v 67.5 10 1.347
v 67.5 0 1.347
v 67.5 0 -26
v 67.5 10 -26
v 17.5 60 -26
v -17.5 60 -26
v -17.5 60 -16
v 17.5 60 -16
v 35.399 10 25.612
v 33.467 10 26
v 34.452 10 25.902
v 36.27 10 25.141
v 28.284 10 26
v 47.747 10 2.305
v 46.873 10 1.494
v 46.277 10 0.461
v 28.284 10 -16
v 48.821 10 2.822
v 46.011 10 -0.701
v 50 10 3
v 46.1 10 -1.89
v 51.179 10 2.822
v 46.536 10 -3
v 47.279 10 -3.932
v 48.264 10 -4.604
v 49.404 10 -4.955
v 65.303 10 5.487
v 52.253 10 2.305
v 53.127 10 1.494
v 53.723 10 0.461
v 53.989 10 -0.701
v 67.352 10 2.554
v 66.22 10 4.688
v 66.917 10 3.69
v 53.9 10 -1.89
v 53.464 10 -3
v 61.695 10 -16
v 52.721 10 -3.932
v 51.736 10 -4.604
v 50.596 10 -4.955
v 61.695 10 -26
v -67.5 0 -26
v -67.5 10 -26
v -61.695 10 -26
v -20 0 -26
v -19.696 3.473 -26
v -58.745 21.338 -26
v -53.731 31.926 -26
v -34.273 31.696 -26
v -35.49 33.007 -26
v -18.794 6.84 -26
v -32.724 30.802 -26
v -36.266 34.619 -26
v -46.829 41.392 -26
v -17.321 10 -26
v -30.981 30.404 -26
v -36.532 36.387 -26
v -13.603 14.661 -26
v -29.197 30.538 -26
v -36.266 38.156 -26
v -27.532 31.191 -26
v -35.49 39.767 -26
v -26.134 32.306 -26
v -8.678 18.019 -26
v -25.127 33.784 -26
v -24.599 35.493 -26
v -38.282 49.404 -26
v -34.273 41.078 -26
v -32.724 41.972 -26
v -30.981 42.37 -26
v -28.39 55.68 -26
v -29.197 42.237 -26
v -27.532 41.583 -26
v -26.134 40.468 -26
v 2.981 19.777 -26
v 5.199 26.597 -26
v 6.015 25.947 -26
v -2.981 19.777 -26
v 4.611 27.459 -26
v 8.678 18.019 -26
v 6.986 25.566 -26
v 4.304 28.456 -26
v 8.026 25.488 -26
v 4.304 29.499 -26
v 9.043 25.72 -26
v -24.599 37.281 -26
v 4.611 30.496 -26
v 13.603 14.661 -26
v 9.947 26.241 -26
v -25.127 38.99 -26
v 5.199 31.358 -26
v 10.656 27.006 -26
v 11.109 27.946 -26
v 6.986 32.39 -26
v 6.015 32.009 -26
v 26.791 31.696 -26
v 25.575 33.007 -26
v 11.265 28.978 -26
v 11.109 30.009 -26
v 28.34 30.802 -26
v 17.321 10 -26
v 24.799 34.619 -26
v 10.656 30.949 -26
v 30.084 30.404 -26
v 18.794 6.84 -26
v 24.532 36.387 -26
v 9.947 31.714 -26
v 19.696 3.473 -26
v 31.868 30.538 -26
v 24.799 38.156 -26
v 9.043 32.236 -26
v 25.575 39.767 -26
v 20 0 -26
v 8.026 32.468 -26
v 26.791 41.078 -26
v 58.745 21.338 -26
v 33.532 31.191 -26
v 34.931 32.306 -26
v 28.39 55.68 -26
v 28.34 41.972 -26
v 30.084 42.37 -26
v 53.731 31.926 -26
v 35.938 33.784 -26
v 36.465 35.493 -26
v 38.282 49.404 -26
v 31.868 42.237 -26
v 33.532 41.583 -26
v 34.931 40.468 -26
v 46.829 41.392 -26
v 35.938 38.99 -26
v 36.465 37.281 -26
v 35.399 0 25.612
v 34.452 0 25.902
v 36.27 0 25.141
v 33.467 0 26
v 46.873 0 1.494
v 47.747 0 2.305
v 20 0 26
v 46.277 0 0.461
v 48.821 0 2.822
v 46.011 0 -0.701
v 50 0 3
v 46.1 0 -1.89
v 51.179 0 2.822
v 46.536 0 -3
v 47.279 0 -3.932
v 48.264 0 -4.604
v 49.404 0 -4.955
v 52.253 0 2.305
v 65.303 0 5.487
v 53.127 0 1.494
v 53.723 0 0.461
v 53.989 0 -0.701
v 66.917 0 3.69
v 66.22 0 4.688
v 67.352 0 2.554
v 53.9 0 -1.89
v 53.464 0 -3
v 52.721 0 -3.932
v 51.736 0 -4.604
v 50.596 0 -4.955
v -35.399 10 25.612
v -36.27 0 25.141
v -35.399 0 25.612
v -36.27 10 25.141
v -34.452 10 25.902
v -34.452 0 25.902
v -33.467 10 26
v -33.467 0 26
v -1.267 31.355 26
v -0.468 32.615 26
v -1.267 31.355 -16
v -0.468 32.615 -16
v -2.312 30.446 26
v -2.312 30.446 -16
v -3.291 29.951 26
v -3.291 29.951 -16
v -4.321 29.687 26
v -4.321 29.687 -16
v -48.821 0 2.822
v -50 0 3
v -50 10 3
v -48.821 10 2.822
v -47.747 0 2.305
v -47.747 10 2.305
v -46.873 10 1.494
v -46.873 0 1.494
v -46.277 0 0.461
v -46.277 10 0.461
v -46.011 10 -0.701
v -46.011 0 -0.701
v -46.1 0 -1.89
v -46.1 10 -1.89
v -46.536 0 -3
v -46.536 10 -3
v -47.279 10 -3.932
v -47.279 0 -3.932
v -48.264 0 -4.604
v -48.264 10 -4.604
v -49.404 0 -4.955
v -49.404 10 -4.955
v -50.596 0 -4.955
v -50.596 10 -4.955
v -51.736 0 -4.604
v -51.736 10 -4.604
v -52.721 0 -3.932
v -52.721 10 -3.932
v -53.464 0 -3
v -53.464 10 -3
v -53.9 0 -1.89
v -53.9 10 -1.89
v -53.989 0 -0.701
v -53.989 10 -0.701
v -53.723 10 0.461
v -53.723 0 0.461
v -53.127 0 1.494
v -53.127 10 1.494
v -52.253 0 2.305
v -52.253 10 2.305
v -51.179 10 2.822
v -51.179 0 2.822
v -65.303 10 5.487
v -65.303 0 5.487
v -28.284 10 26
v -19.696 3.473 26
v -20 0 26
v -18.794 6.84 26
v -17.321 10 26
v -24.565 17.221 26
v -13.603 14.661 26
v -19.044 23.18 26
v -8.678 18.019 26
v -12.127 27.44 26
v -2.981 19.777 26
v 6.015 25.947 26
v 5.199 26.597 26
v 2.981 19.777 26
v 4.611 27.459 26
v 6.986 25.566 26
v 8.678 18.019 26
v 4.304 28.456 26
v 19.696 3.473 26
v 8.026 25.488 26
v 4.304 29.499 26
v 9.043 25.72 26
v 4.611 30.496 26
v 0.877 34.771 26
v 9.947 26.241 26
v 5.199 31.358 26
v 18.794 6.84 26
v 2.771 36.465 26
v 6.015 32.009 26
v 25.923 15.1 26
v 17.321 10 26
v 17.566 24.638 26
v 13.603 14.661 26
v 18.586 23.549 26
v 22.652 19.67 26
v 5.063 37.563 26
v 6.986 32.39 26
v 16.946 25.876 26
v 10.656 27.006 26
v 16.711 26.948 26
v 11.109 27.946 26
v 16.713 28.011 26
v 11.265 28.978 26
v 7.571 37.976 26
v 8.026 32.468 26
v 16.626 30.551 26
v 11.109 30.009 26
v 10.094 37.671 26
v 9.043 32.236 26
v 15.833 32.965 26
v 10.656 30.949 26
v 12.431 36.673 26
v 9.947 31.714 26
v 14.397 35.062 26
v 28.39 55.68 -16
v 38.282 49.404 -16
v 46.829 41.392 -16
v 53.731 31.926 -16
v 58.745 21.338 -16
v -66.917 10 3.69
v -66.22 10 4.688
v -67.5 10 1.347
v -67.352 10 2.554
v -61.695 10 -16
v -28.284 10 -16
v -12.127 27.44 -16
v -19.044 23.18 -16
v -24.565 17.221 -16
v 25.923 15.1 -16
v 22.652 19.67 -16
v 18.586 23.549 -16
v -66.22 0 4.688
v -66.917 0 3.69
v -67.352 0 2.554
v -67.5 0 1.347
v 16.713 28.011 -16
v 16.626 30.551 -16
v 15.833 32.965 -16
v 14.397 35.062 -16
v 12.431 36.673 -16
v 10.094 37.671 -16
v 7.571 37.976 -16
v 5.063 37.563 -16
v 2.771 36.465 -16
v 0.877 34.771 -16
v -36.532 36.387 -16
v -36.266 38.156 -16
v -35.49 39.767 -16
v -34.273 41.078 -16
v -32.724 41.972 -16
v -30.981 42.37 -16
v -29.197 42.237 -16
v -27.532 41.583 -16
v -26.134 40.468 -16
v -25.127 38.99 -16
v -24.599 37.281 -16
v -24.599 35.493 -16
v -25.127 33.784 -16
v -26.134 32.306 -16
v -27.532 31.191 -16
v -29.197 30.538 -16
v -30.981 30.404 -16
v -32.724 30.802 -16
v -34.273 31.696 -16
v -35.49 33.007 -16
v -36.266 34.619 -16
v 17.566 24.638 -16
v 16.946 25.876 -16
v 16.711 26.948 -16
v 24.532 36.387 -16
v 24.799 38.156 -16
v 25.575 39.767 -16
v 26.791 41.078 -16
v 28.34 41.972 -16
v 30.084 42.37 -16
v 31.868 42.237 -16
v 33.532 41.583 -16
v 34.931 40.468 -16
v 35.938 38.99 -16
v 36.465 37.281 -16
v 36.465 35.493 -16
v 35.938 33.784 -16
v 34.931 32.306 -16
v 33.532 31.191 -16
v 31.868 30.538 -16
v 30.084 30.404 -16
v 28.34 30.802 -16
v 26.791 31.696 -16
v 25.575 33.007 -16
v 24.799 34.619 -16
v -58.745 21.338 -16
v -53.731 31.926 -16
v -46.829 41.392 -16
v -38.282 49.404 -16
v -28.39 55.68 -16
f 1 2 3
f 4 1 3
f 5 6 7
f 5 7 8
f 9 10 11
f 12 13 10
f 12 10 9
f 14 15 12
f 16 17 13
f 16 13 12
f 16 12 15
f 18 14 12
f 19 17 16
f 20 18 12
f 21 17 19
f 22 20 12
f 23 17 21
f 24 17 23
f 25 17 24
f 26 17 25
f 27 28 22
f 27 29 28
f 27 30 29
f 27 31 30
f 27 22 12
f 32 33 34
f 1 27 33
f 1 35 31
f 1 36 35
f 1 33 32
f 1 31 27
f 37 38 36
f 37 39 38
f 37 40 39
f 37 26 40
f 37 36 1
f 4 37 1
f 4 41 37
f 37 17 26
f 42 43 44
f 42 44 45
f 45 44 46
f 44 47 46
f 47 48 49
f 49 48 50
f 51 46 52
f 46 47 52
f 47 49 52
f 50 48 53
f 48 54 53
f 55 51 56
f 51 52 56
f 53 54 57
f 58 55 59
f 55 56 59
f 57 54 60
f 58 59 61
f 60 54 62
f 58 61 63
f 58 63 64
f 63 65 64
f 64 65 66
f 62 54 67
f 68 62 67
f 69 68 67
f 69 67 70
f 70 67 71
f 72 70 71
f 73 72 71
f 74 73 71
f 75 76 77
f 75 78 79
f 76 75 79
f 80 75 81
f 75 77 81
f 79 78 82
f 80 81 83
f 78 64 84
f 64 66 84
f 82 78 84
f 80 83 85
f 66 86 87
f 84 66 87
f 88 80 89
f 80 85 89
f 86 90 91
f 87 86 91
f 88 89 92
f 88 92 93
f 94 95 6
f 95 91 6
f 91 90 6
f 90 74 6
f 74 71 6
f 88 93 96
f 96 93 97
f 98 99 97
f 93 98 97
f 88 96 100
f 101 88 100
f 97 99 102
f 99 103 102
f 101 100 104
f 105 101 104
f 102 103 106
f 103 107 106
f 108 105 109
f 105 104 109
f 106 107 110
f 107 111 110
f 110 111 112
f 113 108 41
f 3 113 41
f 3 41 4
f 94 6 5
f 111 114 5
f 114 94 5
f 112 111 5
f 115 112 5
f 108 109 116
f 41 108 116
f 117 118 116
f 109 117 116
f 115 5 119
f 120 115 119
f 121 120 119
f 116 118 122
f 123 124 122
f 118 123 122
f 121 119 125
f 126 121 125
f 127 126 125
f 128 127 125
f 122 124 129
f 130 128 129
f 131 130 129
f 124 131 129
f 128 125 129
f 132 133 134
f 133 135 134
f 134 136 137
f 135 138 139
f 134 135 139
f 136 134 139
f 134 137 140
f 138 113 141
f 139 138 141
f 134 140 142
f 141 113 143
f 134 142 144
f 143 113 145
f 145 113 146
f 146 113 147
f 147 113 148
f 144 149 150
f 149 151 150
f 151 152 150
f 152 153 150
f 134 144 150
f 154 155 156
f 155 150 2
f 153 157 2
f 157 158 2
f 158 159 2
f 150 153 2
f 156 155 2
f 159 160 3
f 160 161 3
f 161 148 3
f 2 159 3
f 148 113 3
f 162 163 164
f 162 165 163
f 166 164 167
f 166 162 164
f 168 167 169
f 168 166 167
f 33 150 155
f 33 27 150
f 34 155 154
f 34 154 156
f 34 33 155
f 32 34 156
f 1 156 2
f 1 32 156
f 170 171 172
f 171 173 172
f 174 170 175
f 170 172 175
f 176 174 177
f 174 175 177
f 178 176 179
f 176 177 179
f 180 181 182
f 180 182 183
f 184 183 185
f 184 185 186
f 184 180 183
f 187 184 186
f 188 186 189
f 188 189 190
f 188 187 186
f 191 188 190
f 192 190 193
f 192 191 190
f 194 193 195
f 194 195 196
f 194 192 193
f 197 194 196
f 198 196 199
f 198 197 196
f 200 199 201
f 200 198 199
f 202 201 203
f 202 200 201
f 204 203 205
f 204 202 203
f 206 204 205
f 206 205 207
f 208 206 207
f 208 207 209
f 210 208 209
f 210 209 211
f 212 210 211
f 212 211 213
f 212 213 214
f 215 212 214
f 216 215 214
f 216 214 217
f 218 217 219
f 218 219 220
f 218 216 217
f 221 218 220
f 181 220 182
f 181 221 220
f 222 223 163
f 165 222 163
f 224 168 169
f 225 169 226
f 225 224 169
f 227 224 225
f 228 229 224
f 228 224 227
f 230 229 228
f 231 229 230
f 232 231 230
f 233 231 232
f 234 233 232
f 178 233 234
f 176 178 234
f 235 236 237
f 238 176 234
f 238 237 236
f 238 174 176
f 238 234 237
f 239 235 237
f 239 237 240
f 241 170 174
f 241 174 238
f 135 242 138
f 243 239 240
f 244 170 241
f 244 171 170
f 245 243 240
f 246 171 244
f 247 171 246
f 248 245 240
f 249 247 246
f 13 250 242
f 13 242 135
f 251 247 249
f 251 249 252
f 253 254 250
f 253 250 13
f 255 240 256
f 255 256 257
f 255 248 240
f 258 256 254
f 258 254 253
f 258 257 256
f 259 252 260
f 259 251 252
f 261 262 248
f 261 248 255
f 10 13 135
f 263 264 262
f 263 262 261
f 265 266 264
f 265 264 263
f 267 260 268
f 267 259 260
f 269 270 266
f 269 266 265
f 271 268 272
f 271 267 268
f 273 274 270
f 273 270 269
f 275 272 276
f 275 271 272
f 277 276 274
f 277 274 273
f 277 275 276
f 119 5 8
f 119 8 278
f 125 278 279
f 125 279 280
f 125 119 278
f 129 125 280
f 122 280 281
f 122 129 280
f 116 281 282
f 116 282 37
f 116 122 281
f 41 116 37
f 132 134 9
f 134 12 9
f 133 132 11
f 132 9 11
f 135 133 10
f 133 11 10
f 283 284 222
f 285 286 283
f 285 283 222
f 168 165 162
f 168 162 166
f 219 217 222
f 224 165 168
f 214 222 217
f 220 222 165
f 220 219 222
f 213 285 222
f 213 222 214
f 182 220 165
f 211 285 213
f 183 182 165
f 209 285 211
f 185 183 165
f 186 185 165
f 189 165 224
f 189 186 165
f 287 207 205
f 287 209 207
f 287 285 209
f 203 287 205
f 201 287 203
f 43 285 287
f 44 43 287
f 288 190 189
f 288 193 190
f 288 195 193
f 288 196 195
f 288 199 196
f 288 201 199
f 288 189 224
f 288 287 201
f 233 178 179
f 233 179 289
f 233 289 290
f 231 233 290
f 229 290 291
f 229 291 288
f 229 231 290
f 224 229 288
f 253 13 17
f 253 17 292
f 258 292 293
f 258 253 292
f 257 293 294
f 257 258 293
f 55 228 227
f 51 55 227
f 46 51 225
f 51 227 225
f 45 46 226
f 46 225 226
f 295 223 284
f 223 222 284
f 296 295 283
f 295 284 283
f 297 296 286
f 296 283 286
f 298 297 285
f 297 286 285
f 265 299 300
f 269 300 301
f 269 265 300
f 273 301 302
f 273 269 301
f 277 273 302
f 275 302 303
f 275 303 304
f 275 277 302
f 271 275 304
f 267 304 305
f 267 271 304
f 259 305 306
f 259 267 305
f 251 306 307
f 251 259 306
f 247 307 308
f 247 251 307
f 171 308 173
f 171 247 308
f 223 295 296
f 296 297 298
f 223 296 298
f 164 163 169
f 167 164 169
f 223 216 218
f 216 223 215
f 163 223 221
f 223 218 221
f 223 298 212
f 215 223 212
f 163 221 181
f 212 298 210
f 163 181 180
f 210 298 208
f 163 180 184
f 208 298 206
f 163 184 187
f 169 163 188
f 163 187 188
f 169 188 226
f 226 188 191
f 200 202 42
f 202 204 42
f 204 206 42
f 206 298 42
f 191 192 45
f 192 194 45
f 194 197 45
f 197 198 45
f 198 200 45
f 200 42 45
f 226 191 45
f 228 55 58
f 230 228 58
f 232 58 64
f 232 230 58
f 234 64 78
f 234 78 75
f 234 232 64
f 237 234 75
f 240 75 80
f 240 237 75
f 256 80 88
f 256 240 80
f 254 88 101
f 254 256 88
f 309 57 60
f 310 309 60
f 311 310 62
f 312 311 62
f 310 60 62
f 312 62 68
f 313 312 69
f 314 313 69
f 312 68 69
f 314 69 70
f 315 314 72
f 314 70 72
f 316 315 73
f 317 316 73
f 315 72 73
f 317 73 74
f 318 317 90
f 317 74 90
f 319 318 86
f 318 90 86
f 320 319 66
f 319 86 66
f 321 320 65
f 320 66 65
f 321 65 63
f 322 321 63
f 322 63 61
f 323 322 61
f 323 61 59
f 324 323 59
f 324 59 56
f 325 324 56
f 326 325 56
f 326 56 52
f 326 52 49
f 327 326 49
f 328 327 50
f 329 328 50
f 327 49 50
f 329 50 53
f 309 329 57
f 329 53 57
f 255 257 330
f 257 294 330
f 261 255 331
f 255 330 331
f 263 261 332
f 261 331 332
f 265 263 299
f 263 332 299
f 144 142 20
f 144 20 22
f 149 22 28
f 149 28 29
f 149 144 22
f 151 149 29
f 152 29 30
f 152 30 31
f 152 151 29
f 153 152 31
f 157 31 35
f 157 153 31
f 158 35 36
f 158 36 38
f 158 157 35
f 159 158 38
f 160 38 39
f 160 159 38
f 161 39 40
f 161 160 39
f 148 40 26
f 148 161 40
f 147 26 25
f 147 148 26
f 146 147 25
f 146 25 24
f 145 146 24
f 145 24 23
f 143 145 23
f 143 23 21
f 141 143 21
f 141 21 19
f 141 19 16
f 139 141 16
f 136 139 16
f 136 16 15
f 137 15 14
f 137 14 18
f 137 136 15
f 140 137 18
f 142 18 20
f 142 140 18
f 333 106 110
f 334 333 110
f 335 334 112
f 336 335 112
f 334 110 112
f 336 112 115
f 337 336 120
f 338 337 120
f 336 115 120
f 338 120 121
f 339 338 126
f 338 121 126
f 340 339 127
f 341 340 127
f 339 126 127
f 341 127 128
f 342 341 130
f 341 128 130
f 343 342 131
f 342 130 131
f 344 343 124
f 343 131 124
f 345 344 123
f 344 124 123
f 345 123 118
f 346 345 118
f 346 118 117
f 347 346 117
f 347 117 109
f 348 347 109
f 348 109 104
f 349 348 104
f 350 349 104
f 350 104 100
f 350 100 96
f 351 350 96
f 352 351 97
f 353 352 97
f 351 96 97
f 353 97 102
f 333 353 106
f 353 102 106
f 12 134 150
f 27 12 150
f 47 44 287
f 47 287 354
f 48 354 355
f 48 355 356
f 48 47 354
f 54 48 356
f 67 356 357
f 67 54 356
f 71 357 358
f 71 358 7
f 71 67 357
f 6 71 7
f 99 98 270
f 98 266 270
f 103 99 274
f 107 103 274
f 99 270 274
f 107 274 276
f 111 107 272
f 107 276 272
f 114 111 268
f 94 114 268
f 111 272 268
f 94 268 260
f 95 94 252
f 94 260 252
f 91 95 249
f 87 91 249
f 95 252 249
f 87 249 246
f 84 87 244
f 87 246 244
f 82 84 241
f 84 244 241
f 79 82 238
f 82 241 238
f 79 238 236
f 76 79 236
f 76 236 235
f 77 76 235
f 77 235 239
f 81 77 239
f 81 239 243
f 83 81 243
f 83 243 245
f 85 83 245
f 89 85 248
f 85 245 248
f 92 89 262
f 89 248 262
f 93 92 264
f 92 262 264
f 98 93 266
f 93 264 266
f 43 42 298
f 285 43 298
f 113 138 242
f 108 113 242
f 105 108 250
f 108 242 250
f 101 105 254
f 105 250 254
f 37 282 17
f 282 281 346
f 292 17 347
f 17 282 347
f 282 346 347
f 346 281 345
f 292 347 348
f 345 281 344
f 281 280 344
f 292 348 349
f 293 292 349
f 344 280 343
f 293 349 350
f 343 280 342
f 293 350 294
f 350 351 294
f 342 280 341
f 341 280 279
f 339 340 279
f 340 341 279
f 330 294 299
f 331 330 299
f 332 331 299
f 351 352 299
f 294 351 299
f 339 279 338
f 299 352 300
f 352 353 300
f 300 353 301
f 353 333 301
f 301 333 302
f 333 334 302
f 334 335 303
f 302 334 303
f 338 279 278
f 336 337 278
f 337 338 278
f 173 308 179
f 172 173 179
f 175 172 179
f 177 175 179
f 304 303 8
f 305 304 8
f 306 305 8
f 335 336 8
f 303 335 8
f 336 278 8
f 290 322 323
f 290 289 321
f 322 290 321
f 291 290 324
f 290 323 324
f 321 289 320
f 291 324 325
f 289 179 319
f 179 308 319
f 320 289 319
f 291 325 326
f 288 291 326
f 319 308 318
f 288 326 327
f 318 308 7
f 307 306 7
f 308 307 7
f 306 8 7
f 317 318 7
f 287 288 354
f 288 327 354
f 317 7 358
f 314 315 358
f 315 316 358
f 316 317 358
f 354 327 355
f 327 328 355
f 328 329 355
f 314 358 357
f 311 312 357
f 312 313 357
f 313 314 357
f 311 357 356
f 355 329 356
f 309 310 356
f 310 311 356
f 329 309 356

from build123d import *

# Parameters (mm, degrees)
SKETCH2_R           = 4
BOSS_EXTRUDE1_DEPTH = 10
CUT_EXTRUDE1_DEPTH  = 86.791899384
SKETCH3_3_R         = 3.5
BOSS_EXTRUDE2_DEPTH = 52
SKETCH4_R           = 3.5
SKETCH4_R_2         = 6
BOSS_EXTRUDE3_DEPTH = 10
FILLET1_R           = 5


with BuildPart() as part:
    # Sketch2 → Boss-Extrude1 (new body)
    with BuildSketch(Plane(origin=(0, 0, 0), x_dir=(1, 0, 0), z_dir=(0, 1, 0))):
        Polygon((-67.5, 26), (-67.5, -4), (-35, -26), (35, -26), (67.5, -4), (67.5, 26), align=None)
        with Locations(Location((-50, 1, 0), (0, 0, 270))):
            Circle(SKETCH2_R, mode=Mode.SUBTRACT)
        with Locations(Location((50, 1, 0), (0, 0, 270))):
            Circle(SKETCH2_R, mode=Mode.SUBTRACT)
    extrude(amount=BOSS_EXTRUDE1_DEPTH)

    # Sketch3 → Cut-Extrude1 (cut, through all)
    with BuildSketch(Plane.XY.offset(26)):
        with BuildLine():
            Line((20, 0), (0, 0))
            Line((0, 0), (-20, 0))
            ThreePointArc((-20, 0), (0, -20), (20, 0))
        make_face()
        with BuildLine():
            Line((17.320508076, 10), (2.679491924, 10))
            Line((2.679491924, 10), (0, 0))
            Line((0, 0), (20, 0))
            ThreePointArc((20, 0), (19.318516526, 5.176380902), (17.320508076, 10))
        make_face()
        with BuildLine():
            Line((0, 0), (2.679491924, 10))
            Line((2.679491924, 10), (-17.320508076, 10))
            ThreePointArc((-17.320508076, 10), (-19.318516526, 5.176380902), (-20, 0))
            Line((-20, 0), (0, 0))
        make_face()
    extrude(amount=-CUT_EXTRUDE1_DEPTH, mode=Mode.SUBTRACT)


with BuildPart() as cut_extrude1_piece_1:
    # of the separate pieces the step leaves, piece 1, a body of its own (cut_extrude1_pieces)
    add(part.part.solids().sort_by_distance((67.5, 0, -26))[0])



with BuildPart() as cut_extrude1_piece_2:
    # of the separate pieces the step leaves, piece 2, a body of its own (cut_extrude1_pieces)
    add(part.part.solids().sort_by_distance((-67.5, 0, -26))[0])


with BuildPart() as cut_extrude1_piece_1_1:
    add(cut_extrude1_piece_1.part)

    add(cut_extrude1_piece_2.part)  # Boss-Extrude2 merges Cut-Extrude1 piece 2
    # Sketch3<3> → Boss-Extrude2 (add)
    with BuildSketch(Plane.XY.offset(26)):
        with BuildLine():
            ThreePointArc((-17.320508076, 10), (0, 20), (17.320508076, 10))
            Line((17.320508076, 10), (28.284271247, 10))
            ThreePointArc((28.284271247, 10), (23.442777244, 18.719941108), (16.010141687, 25.370758033))
            ThreePointArc((16.010141687, 25.370758033), (10.093942759, 37.671107225), (-1.179810402, 29.976791813))
            ThreePointArc((-1.179810402, 29.976791813), (-17.798906698, 24.149511804), (-28.284271247, 10))
            Line((-28.284271247, 10), (-17.320508076, 10))
        make_face()
        with Locations((7.764571353, 28.977774789)):
            Circle(SKETCH3_3_R, mode=Mode.SUBTRACT)
    extrude(amount=-BOSS_EXTRUDE2_DEPTH)

    # Sketch4 → Boss-Extrude3 (add)
    with BuildSketch(Plane(origin=(0, 0, -26), x_dir=(-1, 0, 0), z_dir=(0, 0, -1))):
        with BuildLine():
            ThreePointArc((62.5, 0), (62.298378138, 5.016181951), (61.694813396, 10))
            Line((61.694813396, 10), (28.284271247, 10))
            ThreePointArc((28.284271247, 10), (17.798906698, 24.149511804), (1.179810402, 29.976791813))
            ThreePointArc((1.179810402, 29.976791813), (-10.093942759, 37.671107225), (-16.010141687, 25.370758033))
            ThreePointArc((-16.010141687, 25.370758033), (-23.442777244, 18.719941108), (-28.284271247, 10))
            Line((-28.284271247, 10), (-61.694813396, 10))
            ThreePointArc((-61.694813396, 10), (-62.298378138, 5.016181951), (-62.5, 0))
            Line((-62.5, 0), (-20, 0))
            ThreePointArc((-20, 0), (0, 20), (20, 0))
            Line((20, 0), (62.5, 0))
        make_face()
        with Locations(Location((-7.764571353, 28.977774789, 0), (0, 0, 180))):
            Circle(SKETCH4_R, mode=Mode.SUBTRACT)
        with BuildLine():
            ThreePointArc((61.694813396, 10), (46.82899334, 41.391972444), (17.5, 60))
            Line((17.5, 60), (-17.5, 60))
            ThreePointArc((-17.5, 60), (-46.82899334, 41.391972444), (-61.694813396, 10))
            Line((-61.694813396, 10), (-28.284271247, 10))
            ThreePointArc((-28.284271247, 10), (-23.442777244, 18.719941108), (-16.010141687, 25.370758033))
            ThreePointArc((-16.010141687, 25.370758033), (-10.093942759, 37.671107225), (1.179810402, 29.976791813))
            ThreePointArc((1.179810402, 29.976791813), (17.798906698, 24.149511804), (28.284271247, 10))
            Line((28.284271247, 10), (61.694813396, 10))
        make_face()
        with Locations((-30.53241146, 36.387111048)):
            Circle(SKETCH4_R_2, mode=Mode.SUBTRACT)
        with Locations((30.53241146, 36.387111048)):
            Circle(SKETCH4_R_2, mode=Mode.SUBTRACT)
    extrude(amount=-BOSS_EXTRUDE3_DEPTH)

    # Fillet1
    fillet1_edges = [cut_extrude1_piece_1_1.edges().sort_by_distance(p)[0] for p in [
        (-35, 5, 26),
        (-67.5, 5, 4),
        (35, 5, 26),
        (67.5, 5, 4),
        (16.010141687, 25.370758033, 5),
        (-1.179810402, 29.976791813, 5),
    ]]
    fillet(fillet1_edges, radius=FILLET1_R)


solid = cut_extrude1_piece_1_1.part
